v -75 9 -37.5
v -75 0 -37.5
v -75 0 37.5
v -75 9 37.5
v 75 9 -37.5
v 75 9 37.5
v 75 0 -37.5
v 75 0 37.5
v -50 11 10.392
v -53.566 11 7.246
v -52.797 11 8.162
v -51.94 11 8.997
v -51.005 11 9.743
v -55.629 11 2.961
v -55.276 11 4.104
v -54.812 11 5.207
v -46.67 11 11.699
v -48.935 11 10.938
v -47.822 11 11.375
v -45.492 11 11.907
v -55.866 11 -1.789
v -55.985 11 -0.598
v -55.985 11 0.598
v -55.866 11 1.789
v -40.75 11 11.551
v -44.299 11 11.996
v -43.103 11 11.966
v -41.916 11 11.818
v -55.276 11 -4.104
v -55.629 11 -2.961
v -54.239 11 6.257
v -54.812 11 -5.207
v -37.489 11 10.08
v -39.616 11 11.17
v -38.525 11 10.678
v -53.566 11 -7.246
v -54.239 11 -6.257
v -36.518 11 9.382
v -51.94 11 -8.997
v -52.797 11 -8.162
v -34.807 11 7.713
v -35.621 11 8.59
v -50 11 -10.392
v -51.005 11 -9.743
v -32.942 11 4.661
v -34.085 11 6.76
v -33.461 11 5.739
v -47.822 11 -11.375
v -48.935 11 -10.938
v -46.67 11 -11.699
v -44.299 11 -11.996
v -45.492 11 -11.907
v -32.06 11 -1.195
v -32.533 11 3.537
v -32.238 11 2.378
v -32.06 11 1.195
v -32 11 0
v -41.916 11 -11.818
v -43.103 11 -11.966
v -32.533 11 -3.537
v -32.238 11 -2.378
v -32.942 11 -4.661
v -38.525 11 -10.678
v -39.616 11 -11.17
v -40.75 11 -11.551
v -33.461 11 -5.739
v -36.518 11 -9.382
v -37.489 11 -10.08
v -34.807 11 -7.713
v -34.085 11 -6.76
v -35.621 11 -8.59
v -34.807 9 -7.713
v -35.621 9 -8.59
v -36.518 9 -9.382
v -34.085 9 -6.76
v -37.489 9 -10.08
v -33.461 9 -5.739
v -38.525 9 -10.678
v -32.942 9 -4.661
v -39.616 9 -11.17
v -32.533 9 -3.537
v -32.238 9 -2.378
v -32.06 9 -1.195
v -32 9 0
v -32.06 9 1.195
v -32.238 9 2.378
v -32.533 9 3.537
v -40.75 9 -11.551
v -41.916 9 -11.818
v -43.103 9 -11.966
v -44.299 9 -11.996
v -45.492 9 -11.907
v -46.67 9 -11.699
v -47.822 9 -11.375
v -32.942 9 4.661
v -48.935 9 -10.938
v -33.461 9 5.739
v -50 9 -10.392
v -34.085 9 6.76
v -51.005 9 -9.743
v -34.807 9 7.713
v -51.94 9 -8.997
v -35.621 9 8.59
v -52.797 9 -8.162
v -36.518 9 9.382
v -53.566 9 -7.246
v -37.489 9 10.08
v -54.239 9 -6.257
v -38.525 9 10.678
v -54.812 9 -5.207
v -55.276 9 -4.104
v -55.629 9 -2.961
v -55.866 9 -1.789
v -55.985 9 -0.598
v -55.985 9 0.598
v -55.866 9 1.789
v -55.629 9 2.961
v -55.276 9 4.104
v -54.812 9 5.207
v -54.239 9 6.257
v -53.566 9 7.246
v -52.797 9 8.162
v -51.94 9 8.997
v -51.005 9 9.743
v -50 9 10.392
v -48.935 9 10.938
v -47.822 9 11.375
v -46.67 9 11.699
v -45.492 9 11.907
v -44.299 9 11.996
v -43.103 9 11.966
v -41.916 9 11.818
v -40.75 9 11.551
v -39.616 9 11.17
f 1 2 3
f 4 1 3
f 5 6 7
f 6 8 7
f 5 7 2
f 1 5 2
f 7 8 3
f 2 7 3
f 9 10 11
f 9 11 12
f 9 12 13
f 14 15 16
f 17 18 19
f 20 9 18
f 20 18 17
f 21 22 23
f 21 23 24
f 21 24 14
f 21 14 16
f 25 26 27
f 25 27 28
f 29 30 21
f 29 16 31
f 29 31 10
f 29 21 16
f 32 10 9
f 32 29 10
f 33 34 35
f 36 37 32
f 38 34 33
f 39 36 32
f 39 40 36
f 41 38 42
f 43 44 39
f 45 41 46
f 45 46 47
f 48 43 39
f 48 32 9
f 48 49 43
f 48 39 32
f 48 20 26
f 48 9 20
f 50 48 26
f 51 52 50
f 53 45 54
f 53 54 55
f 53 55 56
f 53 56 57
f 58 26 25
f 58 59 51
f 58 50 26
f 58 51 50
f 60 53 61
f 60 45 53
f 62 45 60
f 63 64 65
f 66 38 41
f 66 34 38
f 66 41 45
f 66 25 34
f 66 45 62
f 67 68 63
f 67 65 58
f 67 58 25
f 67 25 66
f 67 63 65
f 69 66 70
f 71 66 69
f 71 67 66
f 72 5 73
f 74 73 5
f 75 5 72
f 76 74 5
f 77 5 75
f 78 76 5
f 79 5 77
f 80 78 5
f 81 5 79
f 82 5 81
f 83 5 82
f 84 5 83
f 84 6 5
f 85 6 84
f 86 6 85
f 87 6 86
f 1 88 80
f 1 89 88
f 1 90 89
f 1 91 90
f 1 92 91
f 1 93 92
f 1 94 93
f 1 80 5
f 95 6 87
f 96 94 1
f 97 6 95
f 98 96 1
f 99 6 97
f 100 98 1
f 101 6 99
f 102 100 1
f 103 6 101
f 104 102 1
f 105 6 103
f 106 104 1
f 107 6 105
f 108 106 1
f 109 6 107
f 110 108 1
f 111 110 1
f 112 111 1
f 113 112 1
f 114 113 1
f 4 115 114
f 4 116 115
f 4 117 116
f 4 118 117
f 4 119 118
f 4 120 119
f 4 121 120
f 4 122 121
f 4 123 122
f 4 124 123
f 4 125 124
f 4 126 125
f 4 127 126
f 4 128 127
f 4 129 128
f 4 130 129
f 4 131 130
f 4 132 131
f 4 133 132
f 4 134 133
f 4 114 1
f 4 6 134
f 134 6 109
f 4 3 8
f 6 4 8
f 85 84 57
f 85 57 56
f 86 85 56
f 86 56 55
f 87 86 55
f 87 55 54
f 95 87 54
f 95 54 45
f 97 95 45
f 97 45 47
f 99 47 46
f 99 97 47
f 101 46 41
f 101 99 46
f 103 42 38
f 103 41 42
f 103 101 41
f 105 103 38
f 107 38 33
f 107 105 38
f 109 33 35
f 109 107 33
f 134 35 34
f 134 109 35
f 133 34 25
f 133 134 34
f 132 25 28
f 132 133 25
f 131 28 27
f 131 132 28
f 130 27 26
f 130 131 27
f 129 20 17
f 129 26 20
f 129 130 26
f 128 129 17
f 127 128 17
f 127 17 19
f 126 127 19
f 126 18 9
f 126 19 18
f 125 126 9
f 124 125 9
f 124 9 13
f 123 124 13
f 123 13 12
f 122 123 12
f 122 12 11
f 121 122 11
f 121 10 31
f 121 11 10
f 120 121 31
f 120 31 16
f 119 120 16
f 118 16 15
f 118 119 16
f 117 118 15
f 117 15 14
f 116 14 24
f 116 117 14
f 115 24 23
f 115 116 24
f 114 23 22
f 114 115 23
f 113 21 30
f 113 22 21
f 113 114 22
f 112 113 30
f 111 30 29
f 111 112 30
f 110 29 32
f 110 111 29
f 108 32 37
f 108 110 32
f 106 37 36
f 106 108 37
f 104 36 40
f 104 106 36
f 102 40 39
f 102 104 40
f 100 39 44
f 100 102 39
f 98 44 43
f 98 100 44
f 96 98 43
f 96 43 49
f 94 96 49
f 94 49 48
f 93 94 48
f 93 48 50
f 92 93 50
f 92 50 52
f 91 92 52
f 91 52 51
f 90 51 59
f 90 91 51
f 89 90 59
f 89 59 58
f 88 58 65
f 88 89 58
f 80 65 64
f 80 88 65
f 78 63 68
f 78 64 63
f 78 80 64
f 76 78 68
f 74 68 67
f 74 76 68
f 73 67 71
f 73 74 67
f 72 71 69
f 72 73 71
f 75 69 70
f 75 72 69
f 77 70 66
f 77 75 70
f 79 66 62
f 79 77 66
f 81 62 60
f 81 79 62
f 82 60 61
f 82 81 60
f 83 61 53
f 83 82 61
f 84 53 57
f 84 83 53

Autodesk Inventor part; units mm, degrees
ref_plane "YZ Plane" through (0, 0, 0) normal (1, 0, 0) x (0, 1, 0)
ref_plane "XZ Plane" through (0, 0, 0) normal (0, 1, 0) x (-1, 0, 0)
ref_plane "XY Plane" through (0, 0, 0) normal (0, 0, 1) x (1, 0, 0)
sketch "Sketch1" plane through (0, 0, 0) normal (0, 1, 0) x (-1, 0, 0)
  line L0 (75, 37.5) -> (-75, 37.5)
  line L1 (-75, 37.5) -> (-75, -37.5)
  line L2 (-75, -37.5) -> (75, -37.5)
  line L3 (75, -37.5) -> (75, 37.5)
  point P0 (0, 0)
  dimension "d0" = 150
  dimension "d1" = 75
  dimension "d2" = 75
  dimension "d3" = 37.5
extrude "Extrusion1" add sketch "Sketch1" along normal blind 9
sketch "Sketch3" plane through (0, 9, 0) normal (0, 1, 0) x (1, 0, 0)
  line L0 (-75, -37.5) -> (75, -37.5) projected
  line L1 (75, -37.5) -> (75, 37.5) projected
  line L2 (75, 37.5) -> (-75, 37.5) projected
  line L3 (-75, 37.5) -> (-75, -37.5) projected
  circle A0 centre (-44, 0) radius 12
  point P0 (0, 0)
  dimension "d11" = 24
  dimension "d12" = 19
  dimension "d13" = 31
extrude "Extrusion3" add sketch "Sketch3" along normal blind 2 contours A0
equation "\"d2\" = 0.5 * d0"
equation "\"d3\" = 0.5 * d1"
properties part number "Phone"
